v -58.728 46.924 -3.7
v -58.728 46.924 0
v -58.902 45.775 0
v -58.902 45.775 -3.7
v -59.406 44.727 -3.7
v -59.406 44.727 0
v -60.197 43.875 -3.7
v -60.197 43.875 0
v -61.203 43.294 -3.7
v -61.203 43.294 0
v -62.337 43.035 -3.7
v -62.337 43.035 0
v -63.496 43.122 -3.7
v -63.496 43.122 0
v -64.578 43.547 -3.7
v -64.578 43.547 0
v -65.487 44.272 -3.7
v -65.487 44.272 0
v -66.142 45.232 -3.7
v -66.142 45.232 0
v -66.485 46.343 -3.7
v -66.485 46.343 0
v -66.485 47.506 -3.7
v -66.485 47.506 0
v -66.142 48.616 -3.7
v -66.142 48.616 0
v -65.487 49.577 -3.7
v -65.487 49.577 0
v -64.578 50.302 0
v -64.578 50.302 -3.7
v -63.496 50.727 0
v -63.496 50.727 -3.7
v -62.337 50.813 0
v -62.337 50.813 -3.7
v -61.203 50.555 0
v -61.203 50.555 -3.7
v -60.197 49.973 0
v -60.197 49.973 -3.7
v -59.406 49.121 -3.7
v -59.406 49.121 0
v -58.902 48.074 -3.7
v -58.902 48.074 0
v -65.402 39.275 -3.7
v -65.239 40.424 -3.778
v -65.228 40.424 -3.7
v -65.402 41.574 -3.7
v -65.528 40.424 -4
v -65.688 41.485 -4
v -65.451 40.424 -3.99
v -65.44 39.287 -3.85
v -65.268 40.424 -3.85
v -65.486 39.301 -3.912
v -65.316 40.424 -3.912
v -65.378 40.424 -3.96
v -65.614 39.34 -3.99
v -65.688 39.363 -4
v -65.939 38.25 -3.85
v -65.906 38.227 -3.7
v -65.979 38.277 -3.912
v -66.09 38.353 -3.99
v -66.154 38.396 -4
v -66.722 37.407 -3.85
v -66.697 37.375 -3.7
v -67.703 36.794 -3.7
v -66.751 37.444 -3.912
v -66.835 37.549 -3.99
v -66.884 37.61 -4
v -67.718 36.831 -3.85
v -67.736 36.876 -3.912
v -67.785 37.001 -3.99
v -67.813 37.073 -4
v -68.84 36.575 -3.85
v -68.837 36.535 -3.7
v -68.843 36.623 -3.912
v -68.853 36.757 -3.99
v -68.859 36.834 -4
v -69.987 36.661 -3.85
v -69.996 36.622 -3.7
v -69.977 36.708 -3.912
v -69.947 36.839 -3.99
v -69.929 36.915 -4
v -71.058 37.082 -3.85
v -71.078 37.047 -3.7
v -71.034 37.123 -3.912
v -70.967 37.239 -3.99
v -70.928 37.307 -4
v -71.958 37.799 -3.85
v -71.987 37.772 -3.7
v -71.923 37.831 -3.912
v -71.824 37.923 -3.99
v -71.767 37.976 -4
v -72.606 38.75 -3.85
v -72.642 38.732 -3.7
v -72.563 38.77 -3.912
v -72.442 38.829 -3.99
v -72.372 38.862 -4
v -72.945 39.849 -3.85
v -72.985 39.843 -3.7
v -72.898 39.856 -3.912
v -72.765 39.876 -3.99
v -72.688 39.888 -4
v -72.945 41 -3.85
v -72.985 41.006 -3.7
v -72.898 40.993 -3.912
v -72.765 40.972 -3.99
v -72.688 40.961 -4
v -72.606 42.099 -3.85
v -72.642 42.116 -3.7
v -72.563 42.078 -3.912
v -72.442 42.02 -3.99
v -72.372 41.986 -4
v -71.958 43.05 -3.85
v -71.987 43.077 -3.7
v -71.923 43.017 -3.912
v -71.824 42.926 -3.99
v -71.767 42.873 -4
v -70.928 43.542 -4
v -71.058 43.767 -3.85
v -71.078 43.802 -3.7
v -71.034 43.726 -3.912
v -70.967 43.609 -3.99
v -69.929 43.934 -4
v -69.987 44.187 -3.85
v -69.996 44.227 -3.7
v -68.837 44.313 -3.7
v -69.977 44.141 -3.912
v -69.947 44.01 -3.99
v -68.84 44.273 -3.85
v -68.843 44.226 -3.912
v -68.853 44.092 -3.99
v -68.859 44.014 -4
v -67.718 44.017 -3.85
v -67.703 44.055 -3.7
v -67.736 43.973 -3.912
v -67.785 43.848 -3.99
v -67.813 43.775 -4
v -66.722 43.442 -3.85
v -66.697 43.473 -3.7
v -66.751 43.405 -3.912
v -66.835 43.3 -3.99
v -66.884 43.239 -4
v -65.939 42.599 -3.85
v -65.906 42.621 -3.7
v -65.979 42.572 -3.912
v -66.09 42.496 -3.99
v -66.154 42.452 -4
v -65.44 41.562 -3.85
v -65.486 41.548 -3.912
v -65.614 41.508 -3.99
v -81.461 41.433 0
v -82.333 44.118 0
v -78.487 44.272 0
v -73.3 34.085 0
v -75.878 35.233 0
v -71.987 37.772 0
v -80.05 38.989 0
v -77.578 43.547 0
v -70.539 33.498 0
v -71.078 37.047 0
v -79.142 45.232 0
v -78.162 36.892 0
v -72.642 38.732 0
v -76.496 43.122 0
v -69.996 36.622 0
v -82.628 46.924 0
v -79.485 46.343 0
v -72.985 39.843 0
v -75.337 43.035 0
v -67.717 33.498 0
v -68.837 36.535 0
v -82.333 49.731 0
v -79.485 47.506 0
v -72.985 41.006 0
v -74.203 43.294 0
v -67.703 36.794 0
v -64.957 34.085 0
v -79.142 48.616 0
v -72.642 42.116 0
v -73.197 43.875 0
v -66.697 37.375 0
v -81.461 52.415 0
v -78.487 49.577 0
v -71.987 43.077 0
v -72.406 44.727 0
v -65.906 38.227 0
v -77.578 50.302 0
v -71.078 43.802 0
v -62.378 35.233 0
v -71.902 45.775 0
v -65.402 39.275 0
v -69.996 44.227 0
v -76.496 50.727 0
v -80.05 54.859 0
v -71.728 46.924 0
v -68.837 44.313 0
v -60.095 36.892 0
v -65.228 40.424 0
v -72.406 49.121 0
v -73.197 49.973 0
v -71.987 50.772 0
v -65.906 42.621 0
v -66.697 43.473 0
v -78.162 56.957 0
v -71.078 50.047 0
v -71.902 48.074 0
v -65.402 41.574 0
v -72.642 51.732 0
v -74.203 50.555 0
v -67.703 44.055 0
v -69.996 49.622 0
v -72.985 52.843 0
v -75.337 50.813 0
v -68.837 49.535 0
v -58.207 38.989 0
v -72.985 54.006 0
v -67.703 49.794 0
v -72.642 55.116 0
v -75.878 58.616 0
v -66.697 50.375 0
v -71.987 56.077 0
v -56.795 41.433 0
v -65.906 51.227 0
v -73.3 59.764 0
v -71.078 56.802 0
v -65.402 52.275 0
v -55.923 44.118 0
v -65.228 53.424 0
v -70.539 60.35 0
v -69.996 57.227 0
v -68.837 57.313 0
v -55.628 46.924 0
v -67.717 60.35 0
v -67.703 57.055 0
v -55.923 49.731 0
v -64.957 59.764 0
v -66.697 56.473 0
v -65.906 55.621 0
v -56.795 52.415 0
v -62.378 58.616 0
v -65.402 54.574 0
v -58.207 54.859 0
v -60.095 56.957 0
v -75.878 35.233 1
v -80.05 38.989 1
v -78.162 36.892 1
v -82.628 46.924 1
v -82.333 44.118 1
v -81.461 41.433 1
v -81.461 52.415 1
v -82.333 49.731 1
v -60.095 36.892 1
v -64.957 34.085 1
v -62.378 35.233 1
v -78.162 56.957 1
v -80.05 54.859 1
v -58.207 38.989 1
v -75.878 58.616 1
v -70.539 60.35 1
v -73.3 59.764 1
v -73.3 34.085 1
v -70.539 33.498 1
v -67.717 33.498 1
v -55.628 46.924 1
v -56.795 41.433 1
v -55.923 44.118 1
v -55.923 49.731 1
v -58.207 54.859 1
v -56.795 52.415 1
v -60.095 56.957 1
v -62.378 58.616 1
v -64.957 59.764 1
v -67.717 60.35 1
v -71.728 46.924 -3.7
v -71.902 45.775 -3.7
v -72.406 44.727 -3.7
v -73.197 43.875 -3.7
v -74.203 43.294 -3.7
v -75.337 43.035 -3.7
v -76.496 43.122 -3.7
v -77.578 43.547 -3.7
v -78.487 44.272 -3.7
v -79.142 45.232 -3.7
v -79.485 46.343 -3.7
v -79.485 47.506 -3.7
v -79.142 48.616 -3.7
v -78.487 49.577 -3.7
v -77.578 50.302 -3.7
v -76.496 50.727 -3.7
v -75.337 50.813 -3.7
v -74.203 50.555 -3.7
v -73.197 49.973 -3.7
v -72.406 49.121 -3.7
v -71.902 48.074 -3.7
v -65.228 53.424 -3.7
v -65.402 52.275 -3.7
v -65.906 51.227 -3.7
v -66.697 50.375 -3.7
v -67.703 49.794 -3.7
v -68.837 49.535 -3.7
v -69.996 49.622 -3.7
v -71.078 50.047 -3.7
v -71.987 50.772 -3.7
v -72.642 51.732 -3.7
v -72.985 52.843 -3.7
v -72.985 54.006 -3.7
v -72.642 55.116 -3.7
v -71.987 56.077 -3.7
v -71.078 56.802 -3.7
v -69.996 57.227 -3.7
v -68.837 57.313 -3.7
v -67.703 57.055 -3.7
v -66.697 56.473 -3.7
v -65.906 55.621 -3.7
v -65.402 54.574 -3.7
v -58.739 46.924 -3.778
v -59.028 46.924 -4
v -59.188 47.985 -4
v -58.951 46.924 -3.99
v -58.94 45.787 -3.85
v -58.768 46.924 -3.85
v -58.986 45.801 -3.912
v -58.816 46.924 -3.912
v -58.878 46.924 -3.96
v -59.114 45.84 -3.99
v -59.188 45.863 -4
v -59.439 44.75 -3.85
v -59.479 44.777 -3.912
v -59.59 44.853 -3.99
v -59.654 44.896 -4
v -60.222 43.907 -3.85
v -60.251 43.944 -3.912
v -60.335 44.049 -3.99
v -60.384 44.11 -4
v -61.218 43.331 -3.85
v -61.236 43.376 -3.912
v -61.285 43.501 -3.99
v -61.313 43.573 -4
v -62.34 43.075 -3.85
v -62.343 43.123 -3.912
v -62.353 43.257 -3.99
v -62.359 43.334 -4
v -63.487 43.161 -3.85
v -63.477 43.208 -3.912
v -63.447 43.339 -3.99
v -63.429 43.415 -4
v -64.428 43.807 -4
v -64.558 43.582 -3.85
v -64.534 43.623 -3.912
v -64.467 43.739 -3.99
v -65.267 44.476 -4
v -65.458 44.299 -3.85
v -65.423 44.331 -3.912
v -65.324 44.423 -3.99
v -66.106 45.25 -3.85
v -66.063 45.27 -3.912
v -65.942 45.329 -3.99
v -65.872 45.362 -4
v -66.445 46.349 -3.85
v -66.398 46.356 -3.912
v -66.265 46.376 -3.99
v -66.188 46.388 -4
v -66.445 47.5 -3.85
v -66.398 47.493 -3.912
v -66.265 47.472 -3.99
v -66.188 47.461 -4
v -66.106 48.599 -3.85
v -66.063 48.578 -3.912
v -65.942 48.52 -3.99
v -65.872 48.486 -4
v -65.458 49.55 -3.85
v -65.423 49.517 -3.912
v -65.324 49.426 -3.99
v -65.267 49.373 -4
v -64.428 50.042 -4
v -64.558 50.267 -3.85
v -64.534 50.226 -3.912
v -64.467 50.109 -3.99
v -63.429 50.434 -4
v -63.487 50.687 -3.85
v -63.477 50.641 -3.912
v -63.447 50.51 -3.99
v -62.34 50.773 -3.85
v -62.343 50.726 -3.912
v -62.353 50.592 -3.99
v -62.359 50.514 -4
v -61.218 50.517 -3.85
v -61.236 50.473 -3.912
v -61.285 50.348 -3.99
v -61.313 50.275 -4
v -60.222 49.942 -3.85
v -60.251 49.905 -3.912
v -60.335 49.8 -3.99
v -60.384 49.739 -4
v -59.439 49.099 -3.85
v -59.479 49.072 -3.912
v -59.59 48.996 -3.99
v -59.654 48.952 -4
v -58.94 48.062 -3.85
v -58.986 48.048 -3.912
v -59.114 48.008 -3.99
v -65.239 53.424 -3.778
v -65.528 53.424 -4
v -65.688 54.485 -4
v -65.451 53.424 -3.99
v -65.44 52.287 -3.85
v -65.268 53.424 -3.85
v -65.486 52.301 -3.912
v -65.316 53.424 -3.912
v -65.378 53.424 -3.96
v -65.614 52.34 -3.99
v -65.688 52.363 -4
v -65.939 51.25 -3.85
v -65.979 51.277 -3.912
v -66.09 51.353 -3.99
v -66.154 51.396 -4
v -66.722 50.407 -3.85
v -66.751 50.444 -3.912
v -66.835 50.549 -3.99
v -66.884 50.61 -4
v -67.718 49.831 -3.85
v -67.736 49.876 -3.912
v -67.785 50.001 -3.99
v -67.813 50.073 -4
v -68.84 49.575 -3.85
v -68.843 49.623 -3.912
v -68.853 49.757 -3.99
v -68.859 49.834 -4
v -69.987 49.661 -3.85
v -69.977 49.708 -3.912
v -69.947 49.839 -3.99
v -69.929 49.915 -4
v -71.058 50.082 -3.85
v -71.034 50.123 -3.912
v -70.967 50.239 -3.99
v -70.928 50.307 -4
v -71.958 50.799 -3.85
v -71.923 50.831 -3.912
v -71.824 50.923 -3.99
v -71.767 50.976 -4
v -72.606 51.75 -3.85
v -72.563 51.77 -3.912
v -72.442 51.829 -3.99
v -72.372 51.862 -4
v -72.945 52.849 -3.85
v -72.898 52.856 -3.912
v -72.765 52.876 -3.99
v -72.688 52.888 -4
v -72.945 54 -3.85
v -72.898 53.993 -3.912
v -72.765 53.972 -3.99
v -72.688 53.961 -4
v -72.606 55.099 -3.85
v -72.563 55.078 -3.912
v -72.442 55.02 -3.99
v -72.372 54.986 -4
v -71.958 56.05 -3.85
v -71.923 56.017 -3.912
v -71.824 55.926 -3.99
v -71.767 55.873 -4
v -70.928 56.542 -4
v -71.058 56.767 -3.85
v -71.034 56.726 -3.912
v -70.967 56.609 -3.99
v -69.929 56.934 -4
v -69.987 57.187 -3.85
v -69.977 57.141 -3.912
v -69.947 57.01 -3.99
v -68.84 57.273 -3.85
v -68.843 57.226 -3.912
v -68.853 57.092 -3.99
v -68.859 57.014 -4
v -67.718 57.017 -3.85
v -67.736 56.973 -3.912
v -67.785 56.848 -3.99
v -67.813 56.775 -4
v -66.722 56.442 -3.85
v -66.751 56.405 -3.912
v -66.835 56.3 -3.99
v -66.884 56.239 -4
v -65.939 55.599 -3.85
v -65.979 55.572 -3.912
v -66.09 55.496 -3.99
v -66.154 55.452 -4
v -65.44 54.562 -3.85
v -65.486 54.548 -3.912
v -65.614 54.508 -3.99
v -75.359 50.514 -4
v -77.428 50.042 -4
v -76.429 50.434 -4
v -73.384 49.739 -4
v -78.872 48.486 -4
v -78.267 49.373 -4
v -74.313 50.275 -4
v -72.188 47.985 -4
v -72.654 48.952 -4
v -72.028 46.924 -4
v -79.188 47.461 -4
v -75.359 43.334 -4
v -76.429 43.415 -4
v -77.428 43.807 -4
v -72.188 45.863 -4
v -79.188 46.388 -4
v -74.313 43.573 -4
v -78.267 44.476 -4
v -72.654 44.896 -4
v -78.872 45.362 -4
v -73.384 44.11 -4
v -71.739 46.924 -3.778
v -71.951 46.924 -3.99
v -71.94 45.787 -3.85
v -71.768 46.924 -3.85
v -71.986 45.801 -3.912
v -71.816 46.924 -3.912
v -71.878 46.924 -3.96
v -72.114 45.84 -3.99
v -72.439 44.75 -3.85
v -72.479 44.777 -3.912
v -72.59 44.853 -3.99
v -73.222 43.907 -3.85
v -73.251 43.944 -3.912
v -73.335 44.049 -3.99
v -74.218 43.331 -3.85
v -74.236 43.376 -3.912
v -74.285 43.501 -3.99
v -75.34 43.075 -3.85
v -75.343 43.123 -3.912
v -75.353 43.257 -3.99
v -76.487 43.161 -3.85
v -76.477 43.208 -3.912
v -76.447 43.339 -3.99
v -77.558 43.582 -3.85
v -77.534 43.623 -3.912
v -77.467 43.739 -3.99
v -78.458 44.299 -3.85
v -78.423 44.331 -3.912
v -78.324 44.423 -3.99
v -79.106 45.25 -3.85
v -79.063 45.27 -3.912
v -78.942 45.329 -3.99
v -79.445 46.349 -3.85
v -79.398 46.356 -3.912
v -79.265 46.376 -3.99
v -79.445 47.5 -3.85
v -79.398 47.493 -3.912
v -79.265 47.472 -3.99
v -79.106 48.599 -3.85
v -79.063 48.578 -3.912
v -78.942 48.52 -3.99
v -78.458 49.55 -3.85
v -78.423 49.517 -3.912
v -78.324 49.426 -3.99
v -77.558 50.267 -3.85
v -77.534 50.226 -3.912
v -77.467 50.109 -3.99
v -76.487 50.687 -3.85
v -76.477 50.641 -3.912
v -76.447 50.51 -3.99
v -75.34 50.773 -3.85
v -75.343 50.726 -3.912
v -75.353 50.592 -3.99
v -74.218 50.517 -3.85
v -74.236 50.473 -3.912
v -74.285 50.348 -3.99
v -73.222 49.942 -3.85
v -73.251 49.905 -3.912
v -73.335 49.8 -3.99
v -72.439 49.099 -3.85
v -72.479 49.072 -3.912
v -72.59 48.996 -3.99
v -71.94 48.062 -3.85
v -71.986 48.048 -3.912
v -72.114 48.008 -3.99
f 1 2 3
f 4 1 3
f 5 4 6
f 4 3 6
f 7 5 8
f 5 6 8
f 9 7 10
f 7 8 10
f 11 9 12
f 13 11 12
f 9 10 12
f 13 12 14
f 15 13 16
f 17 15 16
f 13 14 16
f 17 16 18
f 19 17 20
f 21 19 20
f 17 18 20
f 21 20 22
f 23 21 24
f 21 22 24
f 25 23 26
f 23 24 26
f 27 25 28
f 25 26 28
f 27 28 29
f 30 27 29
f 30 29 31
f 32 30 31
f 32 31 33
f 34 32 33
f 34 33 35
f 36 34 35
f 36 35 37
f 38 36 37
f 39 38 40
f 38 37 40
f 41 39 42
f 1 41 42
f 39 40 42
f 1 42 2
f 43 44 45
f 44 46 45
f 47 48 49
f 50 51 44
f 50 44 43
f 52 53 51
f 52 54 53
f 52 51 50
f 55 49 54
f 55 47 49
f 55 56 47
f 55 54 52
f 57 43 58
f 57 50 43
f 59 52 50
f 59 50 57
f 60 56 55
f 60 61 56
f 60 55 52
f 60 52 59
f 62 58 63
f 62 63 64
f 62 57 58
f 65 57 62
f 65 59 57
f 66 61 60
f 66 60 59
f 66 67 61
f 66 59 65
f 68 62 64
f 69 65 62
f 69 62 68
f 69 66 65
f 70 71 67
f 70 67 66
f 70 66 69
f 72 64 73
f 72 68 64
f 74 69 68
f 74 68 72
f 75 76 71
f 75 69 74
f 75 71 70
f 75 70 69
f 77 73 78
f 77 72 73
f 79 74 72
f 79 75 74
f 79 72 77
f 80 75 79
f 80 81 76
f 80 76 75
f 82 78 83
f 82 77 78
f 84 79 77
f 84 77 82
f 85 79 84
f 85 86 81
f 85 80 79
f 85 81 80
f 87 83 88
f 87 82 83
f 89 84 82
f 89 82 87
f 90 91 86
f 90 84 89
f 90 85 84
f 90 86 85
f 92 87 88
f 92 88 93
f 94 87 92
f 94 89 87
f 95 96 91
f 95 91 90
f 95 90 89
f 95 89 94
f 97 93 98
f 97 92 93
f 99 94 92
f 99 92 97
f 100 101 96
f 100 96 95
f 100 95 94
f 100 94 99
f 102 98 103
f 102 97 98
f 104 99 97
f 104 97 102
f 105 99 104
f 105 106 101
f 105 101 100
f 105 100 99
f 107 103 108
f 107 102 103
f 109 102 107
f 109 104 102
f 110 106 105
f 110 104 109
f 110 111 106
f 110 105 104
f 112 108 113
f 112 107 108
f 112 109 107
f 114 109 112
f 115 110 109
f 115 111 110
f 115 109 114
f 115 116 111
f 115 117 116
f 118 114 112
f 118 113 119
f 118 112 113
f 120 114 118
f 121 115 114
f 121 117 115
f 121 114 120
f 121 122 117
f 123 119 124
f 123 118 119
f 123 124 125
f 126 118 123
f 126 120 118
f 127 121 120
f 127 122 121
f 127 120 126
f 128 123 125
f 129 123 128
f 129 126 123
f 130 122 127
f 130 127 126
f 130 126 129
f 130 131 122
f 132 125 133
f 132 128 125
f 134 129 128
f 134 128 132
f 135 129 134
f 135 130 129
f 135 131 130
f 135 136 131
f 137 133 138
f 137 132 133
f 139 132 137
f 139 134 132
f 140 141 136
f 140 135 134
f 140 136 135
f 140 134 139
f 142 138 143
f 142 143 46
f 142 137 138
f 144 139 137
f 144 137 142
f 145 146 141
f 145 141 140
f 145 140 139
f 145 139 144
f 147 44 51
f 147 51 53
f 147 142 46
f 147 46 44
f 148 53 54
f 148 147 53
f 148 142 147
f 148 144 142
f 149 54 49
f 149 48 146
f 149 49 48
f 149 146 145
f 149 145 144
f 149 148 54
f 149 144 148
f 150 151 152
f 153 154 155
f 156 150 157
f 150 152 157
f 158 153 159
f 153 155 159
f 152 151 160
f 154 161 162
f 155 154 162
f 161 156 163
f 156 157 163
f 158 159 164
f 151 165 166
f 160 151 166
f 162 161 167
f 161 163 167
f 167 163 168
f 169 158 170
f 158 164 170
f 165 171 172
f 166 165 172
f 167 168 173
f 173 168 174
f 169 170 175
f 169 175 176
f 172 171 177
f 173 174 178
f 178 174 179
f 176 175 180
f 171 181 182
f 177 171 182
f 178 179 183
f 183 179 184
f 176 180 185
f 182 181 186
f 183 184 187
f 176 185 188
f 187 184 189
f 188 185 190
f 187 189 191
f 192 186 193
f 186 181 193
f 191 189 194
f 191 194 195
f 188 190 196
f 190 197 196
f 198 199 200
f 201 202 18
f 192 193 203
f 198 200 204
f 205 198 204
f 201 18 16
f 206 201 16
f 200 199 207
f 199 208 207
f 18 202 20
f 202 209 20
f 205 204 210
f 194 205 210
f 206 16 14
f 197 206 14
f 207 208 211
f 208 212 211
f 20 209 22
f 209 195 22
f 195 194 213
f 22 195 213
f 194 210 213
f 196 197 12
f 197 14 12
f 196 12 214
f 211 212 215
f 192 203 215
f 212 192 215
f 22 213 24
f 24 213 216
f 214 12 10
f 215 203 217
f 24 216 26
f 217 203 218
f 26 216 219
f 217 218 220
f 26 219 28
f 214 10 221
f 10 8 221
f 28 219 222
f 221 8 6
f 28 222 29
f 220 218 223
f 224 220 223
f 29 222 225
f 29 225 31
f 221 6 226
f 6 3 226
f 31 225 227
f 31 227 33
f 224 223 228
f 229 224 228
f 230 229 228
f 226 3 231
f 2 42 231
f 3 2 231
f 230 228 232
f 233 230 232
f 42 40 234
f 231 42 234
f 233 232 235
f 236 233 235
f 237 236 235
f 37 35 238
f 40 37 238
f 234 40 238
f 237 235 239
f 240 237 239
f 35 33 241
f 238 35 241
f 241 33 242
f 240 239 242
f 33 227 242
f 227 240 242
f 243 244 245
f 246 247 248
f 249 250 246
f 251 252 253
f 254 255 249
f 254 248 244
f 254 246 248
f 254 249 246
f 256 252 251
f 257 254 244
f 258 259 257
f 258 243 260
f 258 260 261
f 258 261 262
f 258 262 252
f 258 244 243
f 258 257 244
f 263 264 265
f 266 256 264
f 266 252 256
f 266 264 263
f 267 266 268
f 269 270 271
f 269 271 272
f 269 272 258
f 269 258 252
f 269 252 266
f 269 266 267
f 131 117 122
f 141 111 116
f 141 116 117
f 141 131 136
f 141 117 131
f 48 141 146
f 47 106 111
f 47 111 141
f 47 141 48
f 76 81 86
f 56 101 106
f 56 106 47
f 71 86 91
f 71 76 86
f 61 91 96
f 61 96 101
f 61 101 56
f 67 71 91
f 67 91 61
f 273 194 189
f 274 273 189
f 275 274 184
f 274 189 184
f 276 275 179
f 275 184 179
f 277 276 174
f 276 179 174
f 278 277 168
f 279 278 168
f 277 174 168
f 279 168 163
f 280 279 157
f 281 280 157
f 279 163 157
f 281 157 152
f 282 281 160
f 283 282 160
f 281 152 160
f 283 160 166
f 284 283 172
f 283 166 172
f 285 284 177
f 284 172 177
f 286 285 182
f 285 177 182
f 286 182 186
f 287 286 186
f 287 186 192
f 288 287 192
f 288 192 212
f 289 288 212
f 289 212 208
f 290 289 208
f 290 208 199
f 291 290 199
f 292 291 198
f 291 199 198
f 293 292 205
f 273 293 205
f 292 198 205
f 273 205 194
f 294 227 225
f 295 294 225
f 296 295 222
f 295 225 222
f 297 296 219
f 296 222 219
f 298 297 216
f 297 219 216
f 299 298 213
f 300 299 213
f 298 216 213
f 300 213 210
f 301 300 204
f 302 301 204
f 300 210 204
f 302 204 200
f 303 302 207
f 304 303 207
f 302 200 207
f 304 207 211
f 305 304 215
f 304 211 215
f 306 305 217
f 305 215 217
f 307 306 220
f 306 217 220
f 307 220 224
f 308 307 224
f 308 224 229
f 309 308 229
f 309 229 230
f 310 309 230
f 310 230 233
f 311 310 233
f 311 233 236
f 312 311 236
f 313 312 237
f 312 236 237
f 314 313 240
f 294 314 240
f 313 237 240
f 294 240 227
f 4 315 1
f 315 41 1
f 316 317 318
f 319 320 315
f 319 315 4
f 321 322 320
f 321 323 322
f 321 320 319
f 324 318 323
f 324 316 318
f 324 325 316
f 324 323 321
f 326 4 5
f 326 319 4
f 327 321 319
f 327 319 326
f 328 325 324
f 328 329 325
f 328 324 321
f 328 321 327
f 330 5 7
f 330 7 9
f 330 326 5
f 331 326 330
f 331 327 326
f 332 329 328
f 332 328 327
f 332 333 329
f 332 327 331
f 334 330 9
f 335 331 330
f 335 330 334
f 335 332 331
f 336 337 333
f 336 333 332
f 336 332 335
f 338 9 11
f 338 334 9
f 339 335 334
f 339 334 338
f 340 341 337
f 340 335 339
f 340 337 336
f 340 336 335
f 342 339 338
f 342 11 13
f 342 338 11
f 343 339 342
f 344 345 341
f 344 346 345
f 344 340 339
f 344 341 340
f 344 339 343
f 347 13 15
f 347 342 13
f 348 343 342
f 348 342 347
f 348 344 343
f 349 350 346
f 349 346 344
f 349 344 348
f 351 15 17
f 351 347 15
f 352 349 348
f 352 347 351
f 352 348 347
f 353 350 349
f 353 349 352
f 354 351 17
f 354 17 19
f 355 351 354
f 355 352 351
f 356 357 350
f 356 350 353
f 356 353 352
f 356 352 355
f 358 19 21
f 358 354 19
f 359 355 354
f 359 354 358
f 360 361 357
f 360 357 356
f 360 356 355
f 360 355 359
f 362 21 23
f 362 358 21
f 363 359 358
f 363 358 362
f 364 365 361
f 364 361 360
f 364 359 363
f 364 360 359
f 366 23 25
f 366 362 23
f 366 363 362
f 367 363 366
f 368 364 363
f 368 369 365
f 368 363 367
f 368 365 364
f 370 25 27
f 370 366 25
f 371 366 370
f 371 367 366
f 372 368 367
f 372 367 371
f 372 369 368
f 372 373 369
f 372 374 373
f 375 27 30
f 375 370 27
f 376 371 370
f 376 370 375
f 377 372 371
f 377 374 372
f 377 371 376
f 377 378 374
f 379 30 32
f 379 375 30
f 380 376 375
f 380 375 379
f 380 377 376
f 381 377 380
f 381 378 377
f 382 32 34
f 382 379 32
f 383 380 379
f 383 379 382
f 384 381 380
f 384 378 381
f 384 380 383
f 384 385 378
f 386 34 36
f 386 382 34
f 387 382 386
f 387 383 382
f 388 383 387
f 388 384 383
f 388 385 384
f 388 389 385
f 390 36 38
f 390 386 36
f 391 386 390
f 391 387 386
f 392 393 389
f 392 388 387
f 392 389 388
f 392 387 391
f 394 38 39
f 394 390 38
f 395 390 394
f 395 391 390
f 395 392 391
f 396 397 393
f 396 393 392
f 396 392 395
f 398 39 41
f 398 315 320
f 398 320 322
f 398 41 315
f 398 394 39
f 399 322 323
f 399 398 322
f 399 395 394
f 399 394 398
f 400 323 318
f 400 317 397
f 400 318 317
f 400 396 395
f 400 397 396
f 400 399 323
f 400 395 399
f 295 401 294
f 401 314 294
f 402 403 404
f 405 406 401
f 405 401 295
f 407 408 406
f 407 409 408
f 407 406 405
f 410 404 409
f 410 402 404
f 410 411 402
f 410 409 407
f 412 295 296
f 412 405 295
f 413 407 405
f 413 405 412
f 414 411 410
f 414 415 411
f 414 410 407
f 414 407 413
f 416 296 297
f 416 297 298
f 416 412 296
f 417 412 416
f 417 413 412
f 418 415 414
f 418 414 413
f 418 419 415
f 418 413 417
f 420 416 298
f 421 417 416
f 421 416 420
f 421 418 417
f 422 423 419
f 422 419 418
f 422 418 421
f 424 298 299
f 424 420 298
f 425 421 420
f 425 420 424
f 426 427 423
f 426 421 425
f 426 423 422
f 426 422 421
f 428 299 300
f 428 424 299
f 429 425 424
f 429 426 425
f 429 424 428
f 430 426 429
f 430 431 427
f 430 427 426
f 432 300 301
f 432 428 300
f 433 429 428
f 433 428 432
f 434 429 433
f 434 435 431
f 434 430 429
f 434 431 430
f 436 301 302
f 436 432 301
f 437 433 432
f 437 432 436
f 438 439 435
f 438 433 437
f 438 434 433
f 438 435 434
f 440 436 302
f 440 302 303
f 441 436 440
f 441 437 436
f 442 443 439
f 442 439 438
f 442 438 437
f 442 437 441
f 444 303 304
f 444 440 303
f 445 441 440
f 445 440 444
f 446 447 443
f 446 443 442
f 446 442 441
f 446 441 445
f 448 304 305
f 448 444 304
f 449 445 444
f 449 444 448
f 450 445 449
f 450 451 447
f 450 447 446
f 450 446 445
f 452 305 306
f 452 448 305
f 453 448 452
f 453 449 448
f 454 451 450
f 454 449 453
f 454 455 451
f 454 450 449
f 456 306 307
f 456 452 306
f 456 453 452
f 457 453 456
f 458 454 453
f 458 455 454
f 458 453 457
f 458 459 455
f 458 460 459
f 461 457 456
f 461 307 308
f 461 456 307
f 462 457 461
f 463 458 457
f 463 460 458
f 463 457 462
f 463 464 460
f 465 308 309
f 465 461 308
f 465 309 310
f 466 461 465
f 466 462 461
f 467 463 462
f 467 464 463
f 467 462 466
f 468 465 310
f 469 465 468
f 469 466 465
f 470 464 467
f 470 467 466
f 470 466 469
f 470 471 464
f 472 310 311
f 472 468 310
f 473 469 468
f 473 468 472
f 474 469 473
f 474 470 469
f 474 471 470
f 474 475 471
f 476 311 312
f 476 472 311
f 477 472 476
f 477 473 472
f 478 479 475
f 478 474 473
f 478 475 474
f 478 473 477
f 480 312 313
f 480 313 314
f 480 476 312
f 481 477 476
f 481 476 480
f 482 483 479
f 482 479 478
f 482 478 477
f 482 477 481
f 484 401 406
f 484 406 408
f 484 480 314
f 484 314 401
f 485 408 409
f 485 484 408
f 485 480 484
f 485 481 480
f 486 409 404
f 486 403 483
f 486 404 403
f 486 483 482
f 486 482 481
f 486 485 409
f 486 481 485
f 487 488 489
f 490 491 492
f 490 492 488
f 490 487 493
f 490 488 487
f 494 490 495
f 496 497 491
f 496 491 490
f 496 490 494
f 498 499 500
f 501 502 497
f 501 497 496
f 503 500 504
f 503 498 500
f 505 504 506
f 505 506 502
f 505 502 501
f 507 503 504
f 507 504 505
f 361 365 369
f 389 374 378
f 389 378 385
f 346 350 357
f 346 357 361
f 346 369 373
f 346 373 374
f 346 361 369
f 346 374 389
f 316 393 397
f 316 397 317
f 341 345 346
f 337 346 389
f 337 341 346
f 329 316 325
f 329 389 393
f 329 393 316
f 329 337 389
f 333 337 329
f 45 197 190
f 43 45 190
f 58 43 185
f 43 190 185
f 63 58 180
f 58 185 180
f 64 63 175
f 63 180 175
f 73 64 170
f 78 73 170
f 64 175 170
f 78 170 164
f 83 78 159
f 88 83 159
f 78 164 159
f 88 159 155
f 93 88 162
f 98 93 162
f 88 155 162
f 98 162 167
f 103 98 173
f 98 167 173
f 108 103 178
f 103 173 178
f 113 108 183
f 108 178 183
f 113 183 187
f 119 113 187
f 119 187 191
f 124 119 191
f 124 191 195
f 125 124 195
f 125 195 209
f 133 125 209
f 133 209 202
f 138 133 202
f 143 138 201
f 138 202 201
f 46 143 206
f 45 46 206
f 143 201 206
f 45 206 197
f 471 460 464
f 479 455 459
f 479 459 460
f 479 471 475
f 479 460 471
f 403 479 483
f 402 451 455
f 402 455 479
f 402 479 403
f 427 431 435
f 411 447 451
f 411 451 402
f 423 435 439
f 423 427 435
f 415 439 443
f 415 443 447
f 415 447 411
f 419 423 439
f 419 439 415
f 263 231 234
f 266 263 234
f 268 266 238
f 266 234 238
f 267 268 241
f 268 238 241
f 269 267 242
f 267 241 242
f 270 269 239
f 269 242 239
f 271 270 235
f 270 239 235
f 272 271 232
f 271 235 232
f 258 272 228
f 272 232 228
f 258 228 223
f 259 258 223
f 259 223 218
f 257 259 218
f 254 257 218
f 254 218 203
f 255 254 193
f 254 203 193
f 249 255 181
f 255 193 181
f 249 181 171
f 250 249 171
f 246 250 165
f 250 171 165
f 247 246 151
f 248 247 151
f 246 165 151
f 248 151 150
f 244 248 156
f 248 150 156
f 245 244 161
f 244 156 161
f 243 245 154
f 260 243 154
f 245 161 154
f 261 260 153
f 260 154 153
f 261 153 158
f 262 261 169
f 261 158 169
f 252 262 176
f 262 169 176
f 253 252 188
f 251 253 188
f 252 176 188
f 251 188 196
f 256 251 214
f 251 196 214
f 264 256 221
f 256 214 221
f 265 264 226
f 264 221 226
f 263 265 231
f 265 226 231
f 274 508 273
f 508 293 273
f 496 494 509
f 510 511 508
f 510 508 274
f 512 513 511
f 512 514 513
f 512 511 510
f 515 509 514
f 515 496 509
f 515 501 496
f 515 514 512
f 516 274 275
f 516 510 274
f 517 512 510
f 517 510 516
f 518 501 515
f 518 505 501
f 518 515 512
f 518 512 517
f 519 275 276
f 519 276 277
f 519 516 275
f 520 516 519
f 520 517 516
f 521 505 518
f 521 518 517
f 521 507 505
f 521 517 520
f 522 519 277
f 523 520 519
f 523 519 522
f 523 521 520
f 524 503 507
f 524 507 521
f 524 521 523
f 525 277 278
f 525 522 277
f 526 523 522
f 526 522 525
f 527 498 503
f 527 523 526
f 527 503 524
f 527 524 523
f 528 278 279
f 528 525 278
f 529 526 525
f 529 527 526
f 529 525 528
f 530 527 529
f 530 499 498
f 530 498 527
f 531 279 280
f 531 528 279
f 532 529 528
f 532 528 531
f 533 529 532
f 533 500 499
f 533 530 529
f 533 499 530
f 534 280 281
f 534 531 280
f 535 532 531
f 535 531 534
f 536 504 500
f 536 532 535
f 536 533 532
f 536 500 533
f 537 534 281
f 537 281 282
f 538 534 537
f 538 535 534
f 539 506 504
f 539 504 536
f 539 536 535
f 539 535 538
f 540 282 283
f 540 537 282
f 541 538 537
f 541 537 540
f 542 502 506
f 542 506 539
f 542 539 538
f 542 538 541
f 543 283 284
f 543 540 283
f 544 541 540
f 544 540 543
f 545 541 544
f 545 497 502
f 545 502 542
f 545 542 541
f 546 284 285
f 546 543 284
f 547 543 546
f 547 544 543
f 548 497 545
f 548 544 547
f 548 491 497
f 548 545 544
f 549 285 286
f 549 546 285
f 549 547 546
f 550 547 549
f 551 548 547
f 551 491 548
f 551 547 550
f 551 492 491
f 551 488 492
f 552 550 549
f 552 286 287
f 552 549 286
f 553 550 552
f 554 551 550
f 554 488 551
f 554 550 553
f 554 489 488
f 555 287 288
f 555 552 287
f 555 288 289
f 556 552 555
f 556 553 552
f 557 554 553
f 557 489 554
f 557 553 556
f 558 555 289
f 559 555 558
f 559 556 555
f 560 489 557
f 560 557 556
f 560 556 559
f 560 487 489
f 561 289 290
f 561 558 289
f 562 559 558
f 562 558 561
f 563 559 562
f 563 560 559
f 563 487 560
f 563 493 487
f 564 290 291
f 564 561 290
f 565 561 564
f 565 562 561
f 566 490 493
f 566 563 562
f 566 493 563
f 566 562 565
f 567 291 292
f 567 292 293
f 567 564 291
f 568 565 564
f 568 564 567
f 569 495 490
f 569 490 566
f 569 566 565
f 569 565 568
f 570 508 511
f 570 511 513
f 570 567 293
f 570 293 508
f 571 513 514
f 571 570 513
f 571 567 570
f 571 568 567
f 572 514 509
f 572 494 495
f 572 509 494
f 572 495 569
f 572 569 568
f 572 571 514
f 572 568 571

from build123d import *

# Parameters (mm, degrees)
F0_R     = 13.5
F1_DEPTH = 1
F2_R     = 3.9
F3_DEPTH = 4
F4_R     = 0.3


with BuildPart() as f1:
    # F0 (on Top) → F1 (new body)
    with BuildSketch(Plane.XY):
        with Locations((-69.12829, 46.924345)):
            Circle(F0_R)
    extrude(amount=F1_DEPTH)

    # F2 (on face) → F3 (join)
    with BuildSketch(Plane(origin=(0, 0, 0), x_dir=(1, 0, 0), z_dir=(0, 0, -1))):
        with Locations((-62.62829, -46.924345)):
            Circle(F2_R)
        with Locations((-69.12829, -40.424345)):
            Circle(F2_R)
        with Locations((-75.62829, -46.924345)):
            Circle(F2_R)
        with Locations((-69.12829, -53.424345)):
            Circle(F2_R)
    extrude(amount=F3_DEPTH)

    # F4
    f4_edges = [f1.edges().sort_by_distance(p)[0] for p in [
        (-73.02829, 53.424345, -4),
        (-66.52829, 46.924345, -4),
        (-73.02829, 40.424345, -4),
        (-79.52829, 46.924345, -4),
    ]]
    fillet(f4_edges, radius=F4_R)


solid = f1.part
